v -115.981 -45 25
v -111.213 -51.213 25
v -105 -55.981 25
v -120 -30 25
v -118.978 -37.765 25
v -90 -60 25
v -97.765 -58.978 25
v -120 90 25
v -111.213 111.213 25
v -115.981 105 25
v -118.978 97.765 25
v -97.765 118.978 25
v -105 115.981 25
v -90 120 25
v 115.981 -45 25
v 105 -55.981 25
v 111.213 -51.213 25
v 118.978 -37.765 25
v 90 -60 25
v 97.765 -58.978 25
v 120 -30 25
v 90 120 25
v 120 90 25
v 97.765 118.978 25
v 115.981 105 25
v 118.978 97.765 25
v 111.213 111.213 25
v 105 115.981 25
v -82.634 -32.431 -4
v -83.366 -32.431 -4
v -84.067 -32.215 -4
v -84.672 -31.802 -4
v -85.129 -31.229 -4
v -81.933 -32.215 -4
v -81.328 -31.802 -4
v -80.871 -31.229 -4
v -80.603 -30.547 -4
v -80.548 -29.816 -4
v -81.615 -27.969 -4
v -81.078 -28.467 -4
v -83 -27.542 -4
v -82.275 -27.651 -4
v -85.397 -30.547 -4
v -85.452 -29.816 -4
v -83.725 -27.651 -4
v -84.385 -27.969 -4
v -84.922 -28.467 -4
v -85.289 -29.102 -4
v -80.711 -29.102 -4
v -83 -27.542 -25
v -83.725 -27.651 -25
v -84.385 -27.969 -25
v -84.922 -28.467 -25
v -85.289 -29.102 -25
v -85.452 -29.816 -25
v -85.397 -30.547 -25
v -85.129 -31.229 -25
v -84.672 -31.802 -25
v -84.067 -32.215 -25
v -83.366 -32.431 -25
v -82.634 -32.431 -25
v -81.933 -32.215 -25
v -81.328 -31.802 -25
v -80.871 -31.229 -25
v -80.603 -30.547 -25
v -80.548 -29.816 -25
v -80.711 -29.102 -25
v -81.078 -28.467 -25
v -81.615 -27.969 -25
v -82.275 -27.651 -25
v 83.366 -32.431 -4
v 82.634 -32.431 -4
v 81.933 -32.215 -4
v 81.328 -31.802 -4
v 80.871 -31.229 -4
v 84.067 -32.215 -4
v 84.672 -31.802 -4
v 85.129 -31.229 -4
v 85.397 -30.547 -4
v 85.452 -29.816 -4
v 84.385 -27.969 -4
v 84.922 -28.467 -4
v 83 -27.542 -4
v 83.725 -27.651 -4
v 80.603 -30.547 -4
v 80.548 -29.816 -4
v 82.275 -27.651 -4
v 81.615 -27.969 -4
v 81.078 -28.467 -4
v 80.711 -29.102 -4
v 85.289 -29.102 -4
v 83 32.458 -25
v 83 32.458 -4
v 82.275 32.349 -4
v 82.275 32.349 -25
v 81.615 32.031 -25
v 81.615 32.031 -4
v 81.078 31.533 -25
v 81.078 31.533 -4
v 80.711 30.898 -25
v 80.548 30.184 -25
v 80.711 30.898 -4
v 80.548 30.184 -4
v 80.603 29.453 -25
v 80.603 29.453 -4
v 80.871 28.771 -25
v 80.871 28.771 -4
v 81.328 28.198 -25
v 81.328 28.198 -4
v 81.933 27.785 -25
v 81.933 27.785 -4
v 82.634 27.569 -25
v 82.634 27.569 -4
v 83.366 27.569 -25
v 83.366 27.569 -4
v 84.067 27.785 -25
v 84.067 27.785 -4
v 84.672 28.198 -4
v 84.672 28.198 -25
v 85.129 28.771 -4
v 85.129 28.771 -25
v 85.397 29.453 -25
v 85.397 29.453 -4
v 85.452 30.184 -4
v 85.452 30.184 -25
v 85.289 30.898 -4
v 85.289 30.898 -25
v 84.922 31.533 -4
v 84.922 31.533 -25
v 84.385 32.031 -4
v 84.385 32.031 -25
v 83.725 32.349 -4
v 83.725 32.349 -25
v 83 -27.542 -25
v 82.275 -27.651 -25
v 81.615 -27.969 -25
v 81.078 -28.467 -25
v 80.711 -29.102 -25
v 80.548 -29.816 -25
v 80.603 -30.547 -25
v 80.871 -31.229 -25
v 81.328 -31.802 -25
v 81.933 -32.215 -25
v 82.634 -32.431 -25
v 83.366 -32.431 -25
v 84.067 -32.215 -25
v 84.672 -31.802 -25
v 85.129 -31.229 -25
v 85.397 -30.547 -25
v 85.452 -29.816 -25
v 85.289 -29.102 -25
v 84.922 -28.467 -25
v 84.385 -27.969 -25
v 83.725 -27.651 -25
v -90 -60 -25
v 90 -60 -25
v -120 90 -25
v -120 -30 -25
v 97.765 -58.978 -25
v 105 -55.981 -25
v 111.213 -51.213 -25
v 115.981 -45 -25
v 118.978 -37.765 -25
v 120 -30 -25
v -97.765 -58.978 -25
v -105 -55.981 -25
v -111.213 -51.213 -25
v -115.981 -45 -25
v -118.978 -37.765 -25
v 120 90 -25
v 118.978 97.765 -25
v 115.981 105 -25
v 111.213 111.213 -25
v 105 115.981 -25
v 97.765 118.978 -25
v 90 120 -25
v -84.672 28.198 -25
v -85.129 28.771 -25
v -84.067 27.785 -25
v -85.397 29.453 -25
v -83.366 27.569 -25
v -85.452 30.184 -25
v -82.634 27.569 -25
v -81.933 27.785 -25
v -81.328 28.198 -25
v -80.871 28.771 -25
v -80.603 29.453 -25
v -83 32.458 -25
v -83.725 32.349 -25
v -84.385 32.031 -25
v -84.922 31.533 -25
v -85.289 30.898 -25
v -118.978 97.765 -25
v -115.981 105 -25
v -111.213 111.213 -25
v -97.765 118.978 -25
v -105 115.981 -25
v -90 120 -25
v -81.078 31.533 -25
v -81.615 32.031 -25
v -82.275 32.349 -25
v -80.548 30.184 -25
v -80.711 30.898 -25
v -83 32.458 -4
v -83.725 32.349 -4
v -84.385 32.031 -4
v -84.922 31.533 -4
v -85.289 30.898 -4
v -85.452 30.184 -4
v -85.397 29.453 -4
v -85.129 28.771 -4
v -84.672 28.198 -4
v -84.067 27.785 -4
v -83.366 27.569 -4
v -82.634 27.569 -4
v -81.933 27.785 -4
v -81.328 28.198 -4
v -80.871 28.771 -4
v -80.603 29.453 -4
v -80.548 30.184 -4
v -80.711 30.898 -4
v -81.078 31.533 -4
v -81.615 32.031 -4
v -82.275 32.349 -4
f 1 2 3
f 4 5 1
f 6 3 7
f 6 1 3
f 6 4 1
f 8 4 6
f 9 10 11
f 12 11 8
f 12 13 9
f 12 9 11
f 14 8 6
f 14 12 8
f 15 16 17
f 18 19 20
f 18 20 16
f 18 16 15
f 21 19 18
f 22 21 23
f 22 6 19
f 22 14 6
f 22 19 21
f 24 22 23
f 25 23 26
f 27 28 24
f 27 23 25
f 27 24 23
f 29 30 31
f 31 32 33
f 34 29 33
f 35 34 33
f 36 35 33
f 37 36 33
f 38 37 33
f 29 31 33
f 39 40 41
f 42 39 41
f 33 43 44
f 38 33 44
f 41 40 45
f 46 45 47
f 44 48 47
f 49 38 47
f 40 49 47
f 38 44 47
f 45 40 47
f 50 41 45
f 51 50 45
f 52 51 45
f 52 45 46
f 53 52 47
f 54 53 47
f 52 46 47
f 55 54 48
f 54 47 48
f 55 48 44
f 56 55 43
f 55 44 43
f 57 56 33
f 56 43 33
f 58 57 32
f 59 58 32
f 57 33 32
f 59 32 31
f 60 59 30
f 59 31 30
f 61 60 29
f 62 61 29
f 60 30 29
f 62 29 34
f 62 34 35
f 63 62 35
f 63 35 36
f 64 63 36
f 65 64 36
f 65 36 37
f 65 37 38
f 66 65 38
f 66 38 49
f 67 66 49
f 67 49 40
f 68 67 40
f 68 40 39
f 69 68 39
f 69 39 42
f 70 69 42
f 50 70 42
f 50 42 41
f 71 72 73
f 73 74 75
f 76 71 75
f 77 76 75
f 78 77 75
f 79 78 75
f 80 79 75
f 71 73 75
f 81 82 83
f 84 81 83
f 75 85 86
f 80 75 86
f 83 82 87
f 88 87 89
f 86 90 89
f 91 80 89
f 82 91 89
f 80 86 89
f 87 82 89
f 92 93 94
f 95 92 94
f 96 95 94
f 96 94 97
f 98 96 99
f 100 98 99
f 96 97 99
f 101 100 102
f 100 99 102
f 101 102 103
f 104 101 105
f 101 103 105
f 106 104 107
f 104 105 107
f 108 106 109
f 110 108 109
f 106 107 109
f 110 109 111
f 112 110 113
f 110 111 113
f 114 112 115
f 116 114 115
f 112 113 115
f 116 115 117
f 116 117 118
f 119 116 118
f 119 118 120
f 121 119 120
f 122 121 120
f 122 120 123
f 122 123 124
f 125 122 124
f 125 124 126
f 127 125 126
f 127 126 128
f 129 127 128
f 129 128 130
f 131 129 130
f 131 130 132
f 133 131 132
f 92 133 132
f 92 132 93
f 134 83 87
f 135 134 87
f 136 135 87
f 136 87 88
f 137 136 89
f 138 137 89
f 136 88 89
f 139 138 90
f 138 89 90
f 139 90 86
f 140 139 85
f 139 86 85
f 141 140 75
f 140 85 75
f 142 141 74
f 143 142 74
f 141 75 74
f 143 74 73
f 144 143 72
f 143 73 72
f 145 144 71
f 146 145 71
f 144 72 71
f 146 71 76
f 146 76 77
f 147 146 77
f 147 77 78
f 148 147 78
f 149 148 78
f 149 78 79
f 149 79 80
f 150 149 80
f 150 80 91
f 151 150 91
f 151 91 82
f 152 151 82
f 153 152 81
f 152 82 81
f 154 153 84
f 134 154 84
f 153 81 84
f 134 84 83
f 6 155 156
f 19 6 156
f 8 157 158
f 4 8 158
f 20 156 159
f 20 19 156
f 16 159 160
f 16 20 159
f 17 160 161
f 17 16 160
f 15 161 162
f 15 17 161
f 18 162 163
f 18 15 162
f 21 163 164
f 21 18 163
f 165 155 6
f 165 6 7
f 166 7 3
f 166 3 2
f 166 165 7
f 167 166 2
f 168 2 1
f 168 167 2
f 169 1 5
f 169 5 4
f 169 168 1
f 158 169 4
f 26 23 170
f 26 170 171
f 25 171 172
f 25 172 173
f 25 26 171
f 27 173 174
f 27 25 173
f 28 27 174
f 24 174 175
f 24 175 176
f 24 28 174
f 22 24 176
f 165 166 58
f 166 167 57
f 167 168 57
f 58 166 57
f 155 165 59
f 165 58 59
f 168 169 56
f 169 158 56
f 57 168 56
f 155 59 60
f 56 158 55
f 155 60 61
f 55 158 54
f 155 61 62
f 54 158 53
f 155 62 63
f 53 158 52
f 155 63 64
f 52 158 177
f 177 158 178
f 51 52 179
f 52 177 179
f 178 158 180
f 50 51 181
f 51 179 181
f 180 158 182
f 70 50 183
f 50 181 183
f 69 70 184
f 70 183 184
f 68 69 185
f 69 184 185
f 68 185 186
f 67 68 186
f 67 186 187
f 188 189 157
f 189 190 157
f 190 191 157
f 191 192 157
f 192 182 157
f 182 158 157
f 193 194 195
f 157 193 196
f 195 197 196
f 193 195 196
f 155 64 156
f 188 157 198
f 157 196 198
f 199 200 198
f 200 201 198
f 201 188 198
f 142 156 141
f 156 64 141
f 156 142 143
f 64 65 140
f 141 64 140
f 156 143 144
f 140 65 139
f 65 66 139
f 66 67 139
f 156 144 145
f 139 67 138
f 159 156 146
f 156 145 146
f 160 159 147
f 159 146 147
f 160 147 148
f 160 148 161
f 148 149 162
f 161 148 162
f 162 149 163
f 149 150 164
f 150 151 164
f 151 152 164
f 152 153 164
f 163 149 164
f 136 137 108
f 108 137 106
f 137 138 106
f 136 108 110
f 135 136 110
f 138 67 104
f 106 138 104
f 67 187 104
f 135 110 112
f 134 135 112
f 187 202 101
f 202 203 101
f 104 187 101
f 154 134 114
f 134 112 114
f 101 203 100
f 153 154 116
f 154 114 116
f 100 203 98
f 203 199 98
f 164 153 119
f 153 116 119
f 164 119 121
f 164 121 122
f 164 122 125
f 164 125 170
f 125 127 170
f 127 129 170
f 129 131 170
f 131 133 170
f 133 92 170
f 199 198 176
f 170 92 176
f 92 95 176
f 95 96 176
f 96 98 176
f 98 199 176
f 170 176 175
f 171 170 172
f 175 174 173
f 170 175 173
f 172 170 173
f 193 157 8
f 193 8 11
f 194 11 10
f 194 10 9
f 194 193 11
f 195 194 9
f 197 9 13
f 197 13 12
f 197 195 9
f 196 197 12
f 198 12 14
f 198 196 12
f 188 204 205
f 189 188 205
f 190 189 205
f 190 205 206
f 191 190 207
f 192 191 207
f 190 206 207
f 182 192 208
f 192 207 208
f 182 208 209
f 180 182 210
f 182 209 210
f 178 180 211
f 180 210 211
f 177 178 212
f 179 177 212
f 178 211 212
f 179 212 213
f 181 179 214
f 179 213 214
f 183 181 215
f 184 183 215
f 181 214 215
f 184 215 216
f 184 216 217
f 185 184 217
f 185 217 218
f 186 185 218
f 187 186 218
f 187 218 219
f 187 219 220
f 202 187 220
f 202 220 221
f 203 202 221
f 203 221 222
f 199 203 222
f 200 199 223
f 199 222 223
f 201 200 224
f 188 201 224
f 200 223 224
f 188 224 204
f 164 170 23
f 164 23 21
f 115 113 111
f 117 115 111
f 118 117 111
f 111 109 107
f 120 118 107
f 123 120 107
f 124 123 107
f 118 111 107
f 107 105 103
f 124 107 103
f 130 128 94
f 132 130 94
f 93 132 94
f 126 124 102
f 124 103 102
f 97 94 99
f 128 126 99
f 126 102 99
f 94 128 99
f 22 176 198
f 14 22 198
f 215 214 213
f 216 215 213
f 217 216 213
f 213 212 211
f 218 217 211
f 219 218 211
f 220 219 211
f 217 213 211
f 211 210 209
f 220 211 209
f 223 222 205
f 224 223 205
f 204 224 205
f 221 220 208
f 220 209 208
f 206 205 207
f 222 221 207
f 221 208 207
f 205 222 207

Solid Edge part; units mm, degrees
sketch "Sketch1" plane through (0, 0, 0) normal (0, 0, 1) x (1, 0, 0)
  line L0 (-120, -60) -> (120, -60)
  line L1 (120, 120) -> (120, -60)
  line L2 (120, 120) -> (-120, 120)
  line L3 (-120, 120) -> (-120, -60)
extrude "Protrusion1" add sketch "Sketch1" along normal mid plane 50
fillet "Round_1" radius 30 4 edges at (-120, 120, 0) (-120, -60, 0) (120, -60, 0) (120, 120, 0)
hole "Hole_6" at (83, -30, -25) direction (0, 0, 1) diameter 4.917 depth 21
hole "Hole1" at (83, 30, -25) direction (0, 0, 1) diameter 4.917 depth 21
hole "Hole2" at (-83, 30, -25) direction (0, 0, 1) diameter 4.917 depth 21
hole "Hole3" at (-83, -30, -25) direction (0, 0, 1) diameter 4.917 depth 21
